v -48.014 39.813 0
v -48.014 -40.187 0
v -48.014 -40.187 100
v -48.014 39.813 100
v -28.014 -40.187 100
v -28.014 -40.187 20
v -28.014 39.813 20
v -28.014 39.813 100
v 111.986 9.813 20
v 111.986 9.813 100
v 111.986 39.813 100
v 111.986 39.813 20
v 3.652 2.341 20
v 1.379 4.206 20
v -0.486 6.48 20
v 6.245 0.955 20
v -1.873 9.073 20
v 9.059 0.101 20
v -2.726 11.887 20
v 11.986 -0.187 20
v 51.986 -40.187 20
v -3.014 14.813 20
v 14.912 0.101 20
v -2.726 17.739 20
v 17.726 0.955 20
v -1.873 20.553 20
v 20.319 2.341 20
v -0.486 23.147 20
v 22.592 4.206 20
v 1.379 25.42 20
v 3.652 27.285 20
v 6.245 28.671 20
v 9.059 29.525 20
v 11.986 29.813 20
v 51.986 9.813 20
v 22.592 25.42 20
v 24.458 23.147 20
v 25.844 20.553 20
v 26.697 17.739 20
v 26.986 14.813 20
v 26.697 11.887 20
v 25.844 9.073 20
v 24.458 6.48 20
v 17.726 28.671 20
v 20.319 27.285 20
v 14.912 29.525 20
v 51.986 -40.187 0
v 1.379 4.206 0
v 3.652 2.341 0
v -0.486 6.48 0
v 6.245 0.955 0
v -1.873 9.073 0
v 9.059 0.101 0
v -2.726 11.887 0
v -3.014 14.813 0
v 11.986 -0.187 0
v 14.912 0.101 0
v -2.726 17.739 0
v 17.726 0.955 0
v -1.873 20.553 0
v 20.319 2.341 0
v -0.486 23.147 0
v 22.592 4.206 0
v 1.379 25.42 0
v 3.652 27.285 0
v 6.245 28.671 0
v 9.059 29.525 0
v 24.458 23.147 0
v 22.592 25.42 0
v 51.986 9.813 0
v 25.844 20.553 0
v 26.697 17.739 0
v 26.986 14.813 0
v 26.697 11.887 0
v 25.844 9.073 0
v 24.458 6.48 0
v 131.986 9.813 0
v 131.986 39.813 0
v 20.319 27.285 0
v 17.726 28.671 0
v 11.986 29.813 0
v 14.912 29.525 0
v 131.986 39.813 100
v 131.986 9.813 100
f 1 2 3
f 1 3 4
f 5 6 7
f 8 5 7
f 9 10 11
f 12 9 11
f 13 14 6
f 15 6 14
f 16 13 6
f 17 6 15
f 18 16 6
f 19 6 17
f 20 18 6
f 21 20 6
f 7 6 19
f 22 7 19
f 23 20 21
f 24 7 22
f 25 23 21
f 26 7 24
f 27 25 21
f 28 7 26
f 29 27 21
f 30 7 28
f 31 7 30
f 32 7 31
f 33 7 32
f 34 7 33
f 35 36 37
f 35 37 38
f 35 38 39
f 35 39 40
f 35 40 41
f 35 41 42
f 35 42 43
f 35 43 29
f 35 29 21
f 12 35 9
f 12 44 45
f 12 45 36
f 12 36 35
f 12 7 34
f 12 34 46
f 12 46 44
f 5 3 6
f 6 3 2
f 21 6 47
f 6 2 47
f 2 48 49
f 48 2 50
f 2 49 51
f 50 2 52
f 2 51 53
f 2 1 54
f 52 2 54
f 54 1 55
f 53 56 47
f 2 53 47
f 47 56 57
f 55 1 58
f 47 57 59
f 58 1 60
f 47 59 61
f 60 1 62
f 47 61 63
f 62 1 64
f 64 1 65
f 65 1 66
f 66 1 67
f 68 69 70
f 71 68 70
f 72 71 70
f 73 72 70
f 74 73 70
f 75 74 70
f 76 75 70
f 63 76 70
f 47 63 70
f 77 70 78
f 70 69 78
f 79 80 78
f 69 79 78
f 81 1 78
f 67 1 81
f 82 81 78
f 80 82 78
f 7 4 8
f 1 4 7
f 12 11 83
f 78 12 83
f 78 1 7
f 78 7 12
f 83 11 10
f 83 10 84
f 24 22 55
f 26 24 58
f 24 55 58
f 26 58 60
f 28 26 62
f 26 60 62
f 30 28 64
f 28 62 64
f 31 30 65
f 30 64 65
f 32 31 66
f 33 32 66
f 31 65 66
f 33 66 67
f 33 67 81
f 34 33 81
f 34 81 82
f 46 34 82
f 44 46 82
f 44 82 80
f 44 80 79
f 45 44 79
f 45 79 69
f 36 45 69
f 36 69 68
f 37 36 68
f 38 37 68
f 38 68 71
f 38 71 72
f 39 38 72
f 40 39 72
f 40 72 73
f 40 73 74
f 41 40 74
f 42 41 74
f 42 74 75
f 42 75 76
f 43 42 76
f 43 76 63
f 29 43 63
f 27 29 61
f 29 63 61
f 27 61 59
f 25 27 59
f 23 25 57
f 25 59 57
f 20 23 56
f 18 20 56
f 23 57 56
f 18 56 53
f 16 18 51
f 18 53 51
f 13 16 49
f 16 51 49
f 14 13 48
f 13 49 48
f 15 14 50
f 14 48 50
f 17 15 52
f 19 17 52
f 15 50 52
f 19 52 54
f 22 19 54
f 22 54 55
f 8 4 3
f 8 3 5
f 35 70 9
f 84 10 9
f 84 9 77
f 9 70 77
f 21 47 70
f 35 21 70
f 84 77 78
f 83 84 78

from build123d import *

# Parameters (mm, degrees)
F1_DEPTH = 20
F0_W     = 20
F0_H     = 80
F0_H_2   = 30
F2_DEPTH = 100
F4_D     = 30


with BuildPart() as f1:
    # F0 (on Top) → F1 (new body)
    with BuildSketch(Plane.XY):
        Polygon((111.985649, 39.813087), (-28.014351, 39.813087), (-28.014351, -40.186913), (51.985649, -40.186913), (51.985649, 9.813087), (111.985649, 9.813087), align=None)
    extrude(amount=F1_DEPTH)

    # F0 (on Top) → F2 (join)
    with BuildSketch(Plane.XY):
        with Locations((-38.014351, -0.186913)):
            Rectangle(F0_W, F0_H)
        with Locations((121.985649, 24.813087)):
            Rectangle(F0_W, F0_H_2)
    extrude(amount=F2_DEPTH)

    # F4 (through all)
    with Locations(Plane.XY.offset(20)):
        with Locations((11.985649, 14.813087)):
            Hole(F4_D / 2)


solid = f1.part
